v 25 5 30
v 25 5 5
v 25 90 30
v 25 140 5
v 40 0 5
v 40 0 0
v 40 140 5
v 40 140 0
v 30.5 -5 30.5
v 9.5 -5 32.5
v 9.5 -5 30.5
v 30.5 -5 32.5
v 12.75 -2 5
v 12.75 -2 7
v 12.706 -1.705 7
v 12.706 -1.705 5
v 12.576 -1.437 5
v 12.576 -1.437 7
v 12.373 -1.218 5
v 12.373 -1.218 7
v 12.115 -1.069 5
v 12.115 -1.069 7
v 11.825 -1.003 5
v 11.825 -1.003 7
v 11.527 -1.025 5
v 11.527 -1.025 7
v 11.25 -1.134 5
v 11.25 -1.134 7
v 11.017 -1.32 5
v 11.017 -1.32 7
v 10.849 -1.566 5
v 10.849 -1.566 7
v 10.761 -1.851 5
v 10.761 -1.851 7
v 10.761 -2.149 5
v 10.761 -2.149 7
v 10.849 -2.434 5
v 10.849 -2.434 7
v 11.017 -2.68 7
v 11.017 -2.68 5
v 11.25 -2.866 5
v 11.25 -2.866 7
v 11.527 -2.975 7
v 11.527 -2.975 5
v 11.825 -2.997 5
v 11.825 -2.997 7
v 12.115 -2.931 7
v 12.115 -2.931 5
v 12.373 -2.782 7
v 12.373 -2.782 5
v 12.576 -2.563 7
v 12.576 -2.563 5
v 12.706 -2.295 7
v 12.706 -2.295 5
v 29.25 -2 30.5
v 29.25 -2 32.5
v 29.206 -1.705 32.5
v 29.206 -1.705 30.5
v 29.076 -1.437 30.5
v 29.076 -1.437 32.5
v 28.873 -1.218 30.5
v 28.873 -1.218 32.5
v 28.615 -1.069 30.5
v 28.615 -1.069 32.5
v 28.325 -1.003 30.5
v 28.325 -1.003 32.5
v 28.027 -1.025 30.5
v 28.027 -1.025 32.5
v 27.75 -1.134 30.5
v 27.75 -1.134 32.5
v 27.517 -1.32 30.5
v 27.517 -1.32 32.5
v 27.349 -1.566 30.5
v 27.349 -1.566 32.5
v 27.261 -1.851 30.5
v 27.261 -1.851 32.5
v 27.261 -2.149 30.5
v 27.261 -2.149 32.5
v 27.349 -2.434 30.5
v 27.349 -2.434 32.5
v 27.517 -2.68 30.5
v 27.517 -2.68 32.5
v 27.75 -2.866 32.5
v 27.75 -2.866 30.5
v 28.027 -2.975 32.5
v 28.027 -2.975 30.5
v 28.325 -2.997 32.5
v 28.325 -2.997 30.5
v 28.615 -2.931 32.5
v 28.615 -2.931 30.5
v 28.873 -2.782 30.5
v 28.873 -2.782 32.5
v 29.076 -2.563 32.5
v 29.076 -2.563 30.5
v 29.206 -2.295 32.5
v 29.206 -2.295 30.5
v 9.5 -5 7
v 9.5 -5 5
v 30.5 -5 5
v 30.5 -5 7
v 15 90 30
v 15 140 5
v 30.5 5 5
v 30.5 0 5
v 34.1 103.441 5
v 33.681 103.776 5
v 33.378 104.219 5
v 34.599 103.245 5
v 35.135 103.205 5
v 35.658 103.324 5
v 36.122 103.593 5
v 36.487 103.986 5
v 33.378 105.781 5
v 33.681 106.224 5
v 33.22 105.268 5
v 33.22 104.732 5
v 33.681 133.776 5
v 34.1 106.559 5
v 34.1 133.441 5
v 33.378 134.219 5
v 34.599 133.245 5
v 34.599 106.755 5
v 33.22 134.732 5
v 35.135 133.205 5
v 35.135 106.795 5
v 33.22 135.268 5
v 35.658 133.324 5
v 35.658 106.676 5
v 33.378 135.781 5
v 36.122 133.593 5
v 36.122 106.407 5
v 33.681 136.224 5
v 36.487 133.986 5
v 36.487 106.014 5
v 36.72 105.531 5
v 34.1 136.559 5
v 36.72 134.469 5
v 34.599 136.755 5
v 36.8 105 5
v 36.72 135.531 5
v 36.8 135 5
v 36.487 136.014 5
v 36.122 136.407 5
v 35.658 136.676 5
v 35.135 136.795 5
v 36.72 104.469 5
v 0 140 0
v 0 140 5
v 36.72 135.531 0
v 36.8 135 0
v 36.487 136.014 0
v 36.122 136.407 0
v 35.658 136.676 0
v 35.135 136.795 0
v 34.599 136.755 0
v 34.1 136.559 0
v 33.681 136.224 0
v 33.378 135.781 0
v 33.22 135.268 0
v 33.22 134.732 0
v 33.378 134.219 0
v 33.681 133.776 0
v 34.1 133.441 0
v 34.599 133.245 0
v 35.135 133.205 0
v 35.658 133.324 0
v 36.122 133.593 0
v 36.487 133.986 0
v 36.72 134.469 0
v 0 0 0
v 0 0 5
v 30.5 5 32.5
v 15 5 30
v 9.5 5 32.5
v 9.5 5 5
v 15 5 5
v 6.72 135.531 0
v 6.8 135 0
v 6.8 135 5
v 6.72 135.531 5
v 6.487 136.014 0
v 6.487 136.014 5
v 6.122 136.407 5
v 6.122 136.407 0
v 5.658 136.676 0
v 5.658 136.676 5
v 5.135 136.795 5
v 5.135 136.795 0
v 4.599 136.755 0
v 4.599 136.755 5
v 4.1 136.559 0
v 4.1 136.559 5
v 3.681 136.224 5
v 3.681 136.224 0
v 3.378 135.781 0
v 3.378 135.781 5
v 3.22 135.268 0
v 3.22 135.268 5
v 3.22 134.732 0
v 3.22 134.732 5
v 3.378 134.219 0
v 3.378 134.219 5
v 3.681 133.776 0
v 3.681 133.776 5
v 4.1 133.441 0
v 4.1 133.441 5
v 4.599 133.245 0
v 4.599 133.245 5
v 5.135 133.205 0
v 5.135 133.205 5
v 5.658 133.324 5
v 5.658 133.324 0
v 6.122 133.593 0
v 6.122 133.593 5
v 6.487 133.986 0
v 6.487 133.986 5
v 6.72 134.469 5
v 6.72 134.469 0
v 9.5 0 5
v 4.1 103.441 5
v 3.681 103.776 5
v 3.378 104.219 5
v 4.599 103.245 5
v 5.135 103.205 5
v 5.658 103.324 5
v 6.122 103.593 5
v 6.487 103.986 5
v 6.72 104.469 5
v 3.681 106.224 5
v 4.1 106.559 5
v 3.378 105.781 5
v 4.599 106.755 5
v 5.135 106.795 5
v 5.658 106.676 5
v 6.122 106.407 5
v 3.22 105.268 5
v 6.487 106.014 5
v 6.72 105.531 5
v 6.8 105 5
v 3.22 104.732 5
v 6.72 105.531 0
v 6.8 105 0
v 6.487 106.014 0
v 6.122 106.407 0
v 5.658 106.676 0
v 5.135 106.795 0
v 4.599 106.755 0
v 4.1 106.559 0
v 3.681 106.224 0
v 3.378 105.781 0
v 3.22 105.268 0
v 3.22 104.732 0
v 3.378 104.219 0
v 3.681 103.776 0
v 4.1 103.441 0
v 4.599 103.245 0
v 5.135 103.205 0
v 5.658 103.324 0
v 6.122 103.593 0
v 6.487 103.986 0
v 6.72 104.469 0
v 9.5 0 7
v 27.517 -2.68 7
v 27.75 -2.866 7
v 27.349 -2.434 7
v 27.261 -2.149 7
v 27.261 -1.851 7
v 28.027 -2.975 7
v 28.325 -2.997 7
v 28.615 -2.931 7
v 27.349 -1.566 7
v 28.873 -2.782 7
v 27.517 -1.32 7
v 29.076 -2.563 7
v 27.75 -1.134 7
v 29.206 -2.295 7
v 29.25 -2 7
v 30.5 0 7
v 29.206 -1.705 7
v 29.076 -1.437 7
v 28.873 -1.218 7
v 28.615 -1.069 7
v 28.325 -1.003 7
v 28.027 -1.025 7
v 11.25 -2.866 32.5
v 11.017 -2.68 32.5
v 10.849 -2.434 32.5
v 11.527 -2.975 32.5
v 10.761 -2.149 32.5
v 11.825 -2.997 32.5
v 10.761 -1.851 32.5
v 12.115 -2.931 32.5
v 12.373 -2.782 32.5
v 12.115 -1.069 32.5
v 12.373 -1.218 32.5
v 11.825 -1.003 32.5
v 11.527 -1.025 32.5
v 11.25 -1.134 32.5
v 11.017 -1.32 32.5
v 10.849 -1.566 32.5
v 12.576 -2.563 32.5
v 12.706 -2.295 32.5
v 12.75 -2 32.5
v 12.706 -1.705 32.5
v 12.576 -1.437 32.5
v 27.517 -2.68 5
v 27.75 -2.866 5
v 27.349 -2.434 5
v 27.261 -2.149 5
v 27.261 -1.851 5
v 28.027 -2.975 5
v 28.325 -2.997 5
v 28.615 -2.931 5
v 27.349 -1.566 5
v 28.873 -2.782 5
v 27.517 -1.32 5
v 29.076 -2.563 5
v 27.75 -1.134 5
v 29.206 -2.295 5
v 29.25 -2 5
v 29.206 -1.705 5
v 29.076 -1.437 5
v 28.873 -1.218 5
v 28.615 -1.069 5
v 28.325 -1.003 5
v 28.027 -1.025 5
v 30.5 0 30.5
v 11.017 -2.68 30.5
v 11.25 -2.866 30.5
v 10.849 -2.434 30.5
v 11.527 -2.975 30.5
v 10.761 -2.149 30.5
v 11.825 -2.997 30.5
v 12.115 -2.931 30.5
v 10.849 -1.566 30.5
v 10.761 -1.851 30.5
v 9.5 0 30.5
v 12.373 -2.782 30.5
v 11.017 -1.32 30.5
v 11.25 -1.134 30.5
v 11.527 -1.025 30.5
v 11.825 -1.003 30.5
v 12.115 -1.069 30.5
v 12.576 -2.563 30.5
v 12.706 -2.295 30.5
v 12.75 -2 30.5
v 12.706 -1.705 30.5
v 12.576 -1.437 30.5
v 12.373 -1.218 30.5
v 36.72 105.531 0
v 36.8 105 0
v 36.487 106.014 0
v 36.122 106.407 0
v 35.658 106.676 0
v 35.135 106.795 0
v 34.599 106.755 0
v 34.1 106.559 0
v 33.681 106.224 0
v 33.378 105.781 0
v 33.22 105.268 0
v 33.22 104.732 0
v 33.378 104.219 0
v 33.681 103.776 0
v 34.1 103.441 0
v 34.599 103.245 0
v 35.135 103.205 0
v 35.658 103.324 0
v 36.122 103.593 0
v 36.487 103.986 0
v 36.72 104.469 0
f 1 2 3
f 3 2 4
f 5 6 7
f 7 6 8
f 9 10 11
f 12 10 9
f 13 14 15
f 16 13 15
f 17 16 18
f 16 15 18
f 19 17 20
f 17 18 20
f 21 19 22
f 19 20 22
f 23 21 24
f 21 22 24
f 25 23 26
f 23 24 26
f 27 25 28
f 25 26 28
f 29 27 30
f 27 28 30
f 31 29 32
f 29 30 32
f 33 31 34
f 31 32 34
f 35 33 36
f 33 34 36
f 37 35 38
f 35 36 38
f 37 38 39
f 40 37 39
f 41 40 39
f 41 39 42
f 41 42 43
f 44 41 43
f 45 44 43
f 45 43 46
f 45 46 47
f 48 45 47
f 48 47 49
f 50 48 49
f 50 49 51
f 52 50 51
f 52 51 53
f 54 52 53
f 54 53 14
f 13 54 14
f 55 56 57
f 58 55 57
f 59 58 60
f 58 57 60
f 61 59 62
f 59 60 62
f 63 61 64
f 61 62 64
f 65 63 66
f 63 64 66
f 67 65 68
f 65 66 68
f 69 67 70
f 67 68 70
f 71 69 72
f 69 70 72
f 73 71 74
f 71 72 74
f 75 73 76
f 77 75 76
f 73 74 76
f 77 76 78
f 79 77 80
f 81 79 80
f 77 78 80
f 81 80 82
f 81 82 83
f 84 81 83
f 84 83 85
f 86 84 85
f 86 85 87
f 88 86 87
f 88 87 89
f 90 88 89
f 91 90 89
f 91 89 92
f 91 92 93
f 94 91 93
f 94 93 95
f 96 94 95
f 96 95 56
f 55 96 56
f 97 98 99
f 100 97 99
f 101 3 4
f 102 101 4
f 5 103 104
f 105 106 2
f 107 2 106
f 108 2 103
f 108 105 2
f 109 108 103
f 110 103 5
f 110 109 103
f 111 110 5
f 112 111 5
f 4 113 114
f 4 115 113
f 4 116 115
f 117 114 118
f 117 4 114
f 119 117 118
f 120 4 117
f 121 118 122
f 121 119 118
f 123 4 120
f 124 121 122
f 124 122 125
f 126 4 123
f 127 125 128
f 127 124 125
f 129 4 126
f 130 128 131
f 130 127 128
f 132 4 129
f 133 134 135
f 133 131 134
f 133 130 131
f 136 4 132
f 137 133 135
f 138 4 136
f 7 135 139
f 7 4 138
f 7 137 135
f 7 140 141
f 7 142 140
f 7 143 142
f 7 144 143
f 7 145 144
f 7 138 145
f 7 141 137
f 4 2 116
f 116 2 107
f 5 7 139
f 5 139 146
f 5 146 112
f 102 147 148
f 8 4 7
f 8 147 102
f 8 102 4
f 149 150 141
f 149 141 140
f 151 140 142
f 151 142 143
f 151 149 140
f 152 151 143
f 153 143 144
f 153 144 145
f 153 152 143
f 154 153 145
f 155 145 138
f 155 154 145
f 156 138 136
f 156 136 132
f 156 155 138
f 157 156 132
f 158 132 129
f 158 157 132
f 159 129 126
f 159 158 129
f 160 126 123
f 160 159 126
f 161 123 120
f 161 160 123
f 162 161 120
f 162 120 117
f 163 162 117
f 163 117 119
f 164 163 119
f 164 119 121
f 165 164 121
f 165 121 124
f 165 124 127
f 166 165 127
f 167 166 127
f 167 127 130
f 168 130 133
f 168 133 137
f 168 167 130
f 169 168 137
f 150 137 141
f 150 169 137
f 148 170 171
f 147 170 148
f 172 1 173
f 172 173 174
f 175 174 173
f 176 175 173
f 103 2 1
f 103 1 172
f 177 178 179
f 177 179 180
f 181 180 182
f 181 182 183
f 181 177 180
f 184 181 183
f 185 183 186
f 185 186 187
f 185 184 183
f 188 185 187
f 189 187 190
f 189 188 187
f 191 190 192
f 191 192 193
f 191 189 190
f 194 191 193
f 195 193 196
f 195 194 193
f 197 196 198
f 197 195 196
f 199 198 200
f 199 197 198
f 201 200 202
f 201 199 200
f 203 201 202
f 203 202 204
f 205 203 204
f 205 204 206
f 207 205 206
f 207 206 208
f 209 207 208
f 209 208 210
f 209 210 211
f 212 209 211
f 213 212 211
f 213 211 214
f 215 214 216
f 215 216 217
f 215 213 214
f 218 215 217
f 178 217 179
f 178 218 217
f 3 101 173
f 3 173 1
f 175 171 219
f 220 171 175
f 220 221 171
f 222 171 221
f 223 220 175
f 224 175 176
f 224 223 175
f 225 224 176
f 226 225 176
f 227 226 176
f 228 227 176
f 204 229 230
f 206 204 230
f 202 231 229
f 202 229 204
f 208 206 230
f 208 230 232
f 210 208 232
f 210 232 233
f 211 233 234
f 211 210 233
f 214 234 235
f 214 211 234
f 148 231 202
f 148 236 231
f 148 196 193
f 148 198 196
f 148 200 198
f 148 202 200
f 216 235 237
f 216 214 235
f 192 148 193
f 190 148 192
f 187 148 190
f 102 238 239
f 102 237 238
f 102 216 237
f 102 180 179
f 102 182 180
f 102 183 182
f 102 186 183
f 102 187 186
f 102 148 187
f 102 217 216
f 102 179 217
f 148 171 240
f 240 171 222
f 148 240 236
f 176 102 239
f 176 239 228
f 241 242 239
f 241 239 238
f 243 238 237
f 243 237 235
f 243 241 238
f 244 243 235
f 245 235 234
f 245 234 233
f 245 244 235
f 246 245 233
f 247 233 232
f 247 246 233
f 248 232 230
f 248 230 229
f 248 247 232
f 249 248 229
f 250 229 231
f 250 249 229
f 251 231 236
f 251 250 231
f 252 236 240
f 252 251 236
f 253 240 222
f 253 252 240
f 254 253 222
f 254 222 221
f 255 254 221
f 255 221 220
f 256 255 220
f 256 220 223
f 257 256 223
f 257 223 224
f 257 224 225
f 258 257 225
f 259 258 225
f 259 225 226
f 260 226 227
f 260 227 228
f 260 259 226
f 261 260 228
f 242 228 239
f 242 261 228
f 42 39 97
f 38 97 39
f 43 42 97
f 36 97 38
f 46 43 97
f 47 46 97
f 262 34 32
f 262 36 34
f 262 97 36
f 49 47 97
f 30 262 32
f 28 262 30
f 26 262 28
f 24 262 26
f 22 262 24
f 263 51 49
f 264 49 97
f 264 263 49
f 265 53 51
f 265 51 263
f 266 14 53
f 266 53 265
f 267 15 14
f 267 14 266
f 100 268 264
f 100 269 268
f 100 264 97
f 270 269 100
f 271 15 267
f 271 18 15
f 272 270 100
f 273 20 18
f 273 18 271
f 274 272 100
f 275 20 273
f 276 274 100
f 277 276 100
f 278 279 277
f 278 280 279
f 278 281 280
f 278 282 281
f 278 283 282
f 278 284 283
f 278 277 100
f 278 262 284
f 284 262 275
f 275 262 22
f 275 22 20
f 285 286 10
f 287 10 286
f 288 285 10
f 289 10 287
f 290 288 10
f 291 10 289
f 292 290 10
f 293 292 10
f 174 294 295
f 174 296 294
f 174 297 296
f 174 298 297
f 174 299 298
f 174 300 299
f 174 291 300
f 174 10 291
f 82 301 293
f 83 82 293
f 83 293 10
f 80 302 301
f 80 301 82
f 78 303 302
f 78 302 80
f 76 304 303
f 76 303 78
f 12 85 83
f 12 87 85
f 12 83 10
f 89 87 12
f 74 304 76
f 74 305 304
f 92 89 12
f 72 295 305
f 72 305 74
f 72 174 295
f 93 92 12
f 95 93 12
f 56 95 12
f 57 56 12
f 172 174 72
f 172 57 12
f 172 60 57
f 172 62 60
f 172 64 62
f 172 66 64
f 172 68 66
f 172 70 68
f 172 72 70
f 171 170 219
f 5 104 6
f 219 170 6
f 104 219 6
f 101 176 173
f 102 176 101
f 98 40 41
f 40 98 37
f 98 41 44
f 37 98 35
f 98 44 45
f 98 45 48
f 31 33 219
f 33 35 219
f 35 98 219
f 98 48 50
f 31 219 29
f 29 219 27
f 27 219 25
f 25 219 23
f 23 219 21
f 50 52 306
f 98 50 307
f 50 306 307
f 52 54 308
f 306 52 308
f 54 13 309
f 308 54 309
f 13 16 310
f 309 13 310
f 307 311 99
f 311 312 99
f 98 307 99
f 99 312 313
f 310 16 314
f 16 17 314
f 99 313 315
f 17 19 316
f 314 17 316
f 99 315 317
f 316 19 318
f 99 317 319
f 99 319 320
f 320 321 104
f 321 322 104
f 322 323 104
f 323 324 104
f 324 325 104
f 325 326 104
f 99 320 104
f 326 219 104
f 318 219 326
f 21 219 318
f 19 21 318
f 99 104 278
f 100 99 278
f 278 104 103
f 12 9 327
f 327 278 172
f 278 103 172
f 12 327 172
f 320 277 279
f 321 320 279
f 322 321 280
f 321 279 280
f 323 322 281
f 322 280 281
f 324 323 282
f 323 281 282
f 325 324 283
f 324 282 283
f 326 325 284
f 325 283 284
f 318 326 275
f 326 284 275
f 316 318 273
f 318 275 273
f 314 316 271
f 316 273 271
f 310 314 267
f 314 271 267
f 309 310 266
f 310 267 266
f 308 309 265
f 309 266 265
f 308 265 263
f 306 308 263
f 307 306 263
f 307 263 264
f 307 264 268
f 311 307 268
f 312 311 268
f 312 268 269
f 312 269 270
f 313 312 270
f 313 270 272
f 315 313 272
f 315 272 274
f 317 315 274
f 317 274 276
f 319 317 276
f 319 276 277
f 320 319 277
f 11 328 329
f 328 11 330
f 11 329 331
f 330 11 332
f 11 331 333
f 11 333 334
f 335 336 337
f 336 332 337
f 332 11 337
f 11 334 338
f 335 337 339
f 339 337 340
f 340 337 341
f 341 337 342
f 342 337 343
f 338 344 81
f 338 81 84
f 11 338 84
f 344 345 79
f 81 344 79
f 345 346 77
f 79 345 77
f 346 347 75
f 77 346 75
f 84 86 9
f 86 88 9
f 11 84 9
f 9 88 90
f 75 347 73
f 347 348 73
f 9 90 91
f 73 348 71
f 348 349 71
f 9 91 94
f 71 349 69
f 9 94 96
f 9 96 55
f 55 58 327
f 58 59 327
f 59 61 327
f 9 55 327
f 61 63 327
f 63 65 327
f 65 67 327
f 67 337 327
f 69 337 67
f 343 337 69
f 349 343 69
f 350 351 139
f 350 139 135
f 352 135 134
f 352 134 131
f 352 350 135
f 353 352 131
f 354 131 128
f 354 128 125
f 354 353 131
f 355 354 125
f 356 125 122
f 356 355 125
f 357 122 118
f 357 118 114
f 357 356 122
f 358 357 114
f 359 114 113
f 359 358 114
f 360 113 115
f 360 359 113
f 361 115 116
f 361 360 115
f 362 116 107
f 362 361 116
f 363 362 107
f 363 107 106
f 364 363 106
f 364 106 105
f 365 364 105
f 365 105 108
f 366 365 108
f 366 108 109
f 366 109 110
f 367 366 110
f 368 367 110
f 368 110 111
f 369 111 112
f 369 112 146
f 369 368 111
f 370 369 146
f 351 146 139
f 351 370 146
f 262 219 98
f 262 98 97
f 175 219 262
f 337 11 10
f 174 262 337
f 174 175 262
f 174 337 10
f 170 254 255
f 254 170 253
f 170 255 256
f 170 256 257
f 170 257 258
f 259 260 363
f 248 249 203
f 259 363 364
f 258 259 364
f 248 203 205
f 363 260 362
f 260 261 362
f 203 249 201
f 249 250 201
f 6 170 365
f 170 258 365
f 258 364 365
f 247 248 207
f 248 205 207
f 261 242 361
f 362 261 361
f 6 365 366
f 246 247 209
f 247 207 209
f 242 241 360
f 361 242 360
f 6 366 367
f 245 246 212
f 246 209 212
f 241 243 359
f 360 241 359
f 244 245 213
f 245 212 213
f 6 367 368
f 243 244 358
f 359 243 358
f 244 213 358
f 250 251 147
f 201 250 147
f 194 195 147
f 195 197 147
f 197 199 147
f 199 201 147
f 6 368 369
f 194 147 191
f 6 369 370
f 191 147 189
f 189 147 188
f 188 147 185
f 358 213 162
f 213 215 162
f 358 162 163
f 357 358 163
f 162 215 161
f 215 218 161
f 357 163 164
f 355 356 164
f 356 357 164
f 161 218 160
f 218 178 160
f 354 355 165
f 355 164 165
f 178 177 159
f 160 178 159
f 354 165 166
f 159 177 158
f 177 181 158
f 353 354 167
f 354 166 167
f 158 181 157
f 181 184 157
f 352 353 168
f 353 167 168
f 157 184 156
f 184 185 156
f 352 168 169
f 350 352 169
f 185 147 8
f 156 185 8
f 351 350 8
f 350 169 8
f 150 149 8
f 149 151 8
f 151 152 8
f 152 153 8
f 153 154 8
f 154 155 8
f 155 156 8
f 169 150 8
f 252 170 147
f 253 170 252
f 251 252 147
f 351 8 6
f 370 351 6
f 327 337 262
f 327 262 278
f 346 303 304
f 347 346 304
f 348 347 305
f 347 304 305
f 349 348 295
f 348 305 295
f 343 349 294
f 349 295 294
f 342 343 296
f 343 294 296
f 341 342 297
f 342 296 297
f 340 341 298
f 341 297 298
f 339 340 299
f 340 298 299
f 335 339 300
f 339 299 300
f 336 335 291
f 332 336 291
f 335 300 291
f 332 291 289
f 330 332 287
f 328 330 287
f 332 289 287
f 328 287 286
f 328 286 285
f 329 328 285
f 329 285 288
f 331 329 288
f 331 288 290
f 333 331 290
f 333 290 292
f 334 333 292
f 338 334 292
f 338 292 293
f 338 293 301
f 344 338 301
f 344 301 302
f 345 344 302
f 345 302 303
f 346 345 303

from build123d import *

# Parameters (mm, degrees)
SKETCH_W        = 40
SKETCH_H        = 140
SKETCH_R        = 1.8
PAD_DEPTH       = 5
SKETCH001_W     = 21
SKETCH001_H     = 10
PAD001_DEPTH    = 2
SKETCH002_W     = 21
SKETCH002_H     = 5
PAD002_DEPTH    = 25.5
SKETCH003_W     = 21
SKETCH003_H     = 2
PAD003_DEPTH    = 5
SKETCH004_R     = 1
POCKET_DEPTH    = 100
SKETCH005_W     = 10
SKETCH005_H     = 135
PAD004_DEPTH    = 25
POCKET001_DEPTH = 10


with BuildPart() as part:
    # Sketch → Pad (new body)
    with BuildSketch(Plane.XY):
        with Locations((20, 70)):
            Rectangle(SKETCH_W, SKETCH_H)
        with Locations((5, 135)):
            Circle(SKETCH_R, mode=Mode.SUBTRACT)
        with Locations((35, 135)):
            Circle(SKETCH_R, mode=Mode.SUBTRACT)
        with Locations((5, 105)):
            Circle(SKETCH_R, mode=Mode.SUBTRACT)
        with Locations((35, 105)):
            Circle(SKETCH_R, mode=Mode.SUBTRACT)
    extrude(amount=PAD_DEPTH)

    # Sketch001 (on Face10 of Pad) → Pad001 (join)
    with BuildSketch(Plane.XY.offset(5)):
        with Locations((20, 0)):
            Rectangle(SKETCH001_W, SKETCH001_H)
    extrude(amount=PAD001_DEPTH)

    # Sketch002 (on Face16 of Pad001) → Pad002 (join)
    with BuildSketch(Plane.XY.offset(7)):
        with Locations((20, 2.5)):
            Rectangle(SKETCH002_W, SKETCH002_H)
    extrude(amount=PAD002_DEPTH)

    # Sketch003 (on Face20 of Pad002) → Pad003 (join)
    with BuildSketch(Plane.XZ):
        with Locations((20, 31.5)):
            Rectangle(SKETCH003_W, SKETCH003_H)
    extrude(amount=PAD003_DEPTH)

    # Sketch004 (on Face25 of Pad003) → Pocket (cut)
    with BuildSketch(Plane.XY.offset(32.5)):
        with Locations((11.75, -2)):
            Circle(SKETCH004_R)
        with Locations((28.25, -2)):
            Circle(SKETCH004_R)
    extrude(amount=-POCKET_DEPTH, mode=Mode.SUBTRACT)

    # Sketch005 (on Face5 of Pocket) → Pad004 (join)
    with BuildSketch(Plane.XY.offset(5)):
        with Locations((20, 72.5)):
            Rectangle(SKETCH005_W, SKETCH005_H)
    extrude(amount=PAD004_DEPTH)

    # Sketch006 (on Face16 of Pad004) → Pocket001 (cut)
    with BuildSketch(Plane.YZ.offset(25)):
        Polygon((90, 30), (140, 5), (160, 5), (160, 50), (90, 50), align=None)
    extrude(amount=-POCKET001_DEPTH, mode=Mode.SUBTRACT)


solid = part.part
